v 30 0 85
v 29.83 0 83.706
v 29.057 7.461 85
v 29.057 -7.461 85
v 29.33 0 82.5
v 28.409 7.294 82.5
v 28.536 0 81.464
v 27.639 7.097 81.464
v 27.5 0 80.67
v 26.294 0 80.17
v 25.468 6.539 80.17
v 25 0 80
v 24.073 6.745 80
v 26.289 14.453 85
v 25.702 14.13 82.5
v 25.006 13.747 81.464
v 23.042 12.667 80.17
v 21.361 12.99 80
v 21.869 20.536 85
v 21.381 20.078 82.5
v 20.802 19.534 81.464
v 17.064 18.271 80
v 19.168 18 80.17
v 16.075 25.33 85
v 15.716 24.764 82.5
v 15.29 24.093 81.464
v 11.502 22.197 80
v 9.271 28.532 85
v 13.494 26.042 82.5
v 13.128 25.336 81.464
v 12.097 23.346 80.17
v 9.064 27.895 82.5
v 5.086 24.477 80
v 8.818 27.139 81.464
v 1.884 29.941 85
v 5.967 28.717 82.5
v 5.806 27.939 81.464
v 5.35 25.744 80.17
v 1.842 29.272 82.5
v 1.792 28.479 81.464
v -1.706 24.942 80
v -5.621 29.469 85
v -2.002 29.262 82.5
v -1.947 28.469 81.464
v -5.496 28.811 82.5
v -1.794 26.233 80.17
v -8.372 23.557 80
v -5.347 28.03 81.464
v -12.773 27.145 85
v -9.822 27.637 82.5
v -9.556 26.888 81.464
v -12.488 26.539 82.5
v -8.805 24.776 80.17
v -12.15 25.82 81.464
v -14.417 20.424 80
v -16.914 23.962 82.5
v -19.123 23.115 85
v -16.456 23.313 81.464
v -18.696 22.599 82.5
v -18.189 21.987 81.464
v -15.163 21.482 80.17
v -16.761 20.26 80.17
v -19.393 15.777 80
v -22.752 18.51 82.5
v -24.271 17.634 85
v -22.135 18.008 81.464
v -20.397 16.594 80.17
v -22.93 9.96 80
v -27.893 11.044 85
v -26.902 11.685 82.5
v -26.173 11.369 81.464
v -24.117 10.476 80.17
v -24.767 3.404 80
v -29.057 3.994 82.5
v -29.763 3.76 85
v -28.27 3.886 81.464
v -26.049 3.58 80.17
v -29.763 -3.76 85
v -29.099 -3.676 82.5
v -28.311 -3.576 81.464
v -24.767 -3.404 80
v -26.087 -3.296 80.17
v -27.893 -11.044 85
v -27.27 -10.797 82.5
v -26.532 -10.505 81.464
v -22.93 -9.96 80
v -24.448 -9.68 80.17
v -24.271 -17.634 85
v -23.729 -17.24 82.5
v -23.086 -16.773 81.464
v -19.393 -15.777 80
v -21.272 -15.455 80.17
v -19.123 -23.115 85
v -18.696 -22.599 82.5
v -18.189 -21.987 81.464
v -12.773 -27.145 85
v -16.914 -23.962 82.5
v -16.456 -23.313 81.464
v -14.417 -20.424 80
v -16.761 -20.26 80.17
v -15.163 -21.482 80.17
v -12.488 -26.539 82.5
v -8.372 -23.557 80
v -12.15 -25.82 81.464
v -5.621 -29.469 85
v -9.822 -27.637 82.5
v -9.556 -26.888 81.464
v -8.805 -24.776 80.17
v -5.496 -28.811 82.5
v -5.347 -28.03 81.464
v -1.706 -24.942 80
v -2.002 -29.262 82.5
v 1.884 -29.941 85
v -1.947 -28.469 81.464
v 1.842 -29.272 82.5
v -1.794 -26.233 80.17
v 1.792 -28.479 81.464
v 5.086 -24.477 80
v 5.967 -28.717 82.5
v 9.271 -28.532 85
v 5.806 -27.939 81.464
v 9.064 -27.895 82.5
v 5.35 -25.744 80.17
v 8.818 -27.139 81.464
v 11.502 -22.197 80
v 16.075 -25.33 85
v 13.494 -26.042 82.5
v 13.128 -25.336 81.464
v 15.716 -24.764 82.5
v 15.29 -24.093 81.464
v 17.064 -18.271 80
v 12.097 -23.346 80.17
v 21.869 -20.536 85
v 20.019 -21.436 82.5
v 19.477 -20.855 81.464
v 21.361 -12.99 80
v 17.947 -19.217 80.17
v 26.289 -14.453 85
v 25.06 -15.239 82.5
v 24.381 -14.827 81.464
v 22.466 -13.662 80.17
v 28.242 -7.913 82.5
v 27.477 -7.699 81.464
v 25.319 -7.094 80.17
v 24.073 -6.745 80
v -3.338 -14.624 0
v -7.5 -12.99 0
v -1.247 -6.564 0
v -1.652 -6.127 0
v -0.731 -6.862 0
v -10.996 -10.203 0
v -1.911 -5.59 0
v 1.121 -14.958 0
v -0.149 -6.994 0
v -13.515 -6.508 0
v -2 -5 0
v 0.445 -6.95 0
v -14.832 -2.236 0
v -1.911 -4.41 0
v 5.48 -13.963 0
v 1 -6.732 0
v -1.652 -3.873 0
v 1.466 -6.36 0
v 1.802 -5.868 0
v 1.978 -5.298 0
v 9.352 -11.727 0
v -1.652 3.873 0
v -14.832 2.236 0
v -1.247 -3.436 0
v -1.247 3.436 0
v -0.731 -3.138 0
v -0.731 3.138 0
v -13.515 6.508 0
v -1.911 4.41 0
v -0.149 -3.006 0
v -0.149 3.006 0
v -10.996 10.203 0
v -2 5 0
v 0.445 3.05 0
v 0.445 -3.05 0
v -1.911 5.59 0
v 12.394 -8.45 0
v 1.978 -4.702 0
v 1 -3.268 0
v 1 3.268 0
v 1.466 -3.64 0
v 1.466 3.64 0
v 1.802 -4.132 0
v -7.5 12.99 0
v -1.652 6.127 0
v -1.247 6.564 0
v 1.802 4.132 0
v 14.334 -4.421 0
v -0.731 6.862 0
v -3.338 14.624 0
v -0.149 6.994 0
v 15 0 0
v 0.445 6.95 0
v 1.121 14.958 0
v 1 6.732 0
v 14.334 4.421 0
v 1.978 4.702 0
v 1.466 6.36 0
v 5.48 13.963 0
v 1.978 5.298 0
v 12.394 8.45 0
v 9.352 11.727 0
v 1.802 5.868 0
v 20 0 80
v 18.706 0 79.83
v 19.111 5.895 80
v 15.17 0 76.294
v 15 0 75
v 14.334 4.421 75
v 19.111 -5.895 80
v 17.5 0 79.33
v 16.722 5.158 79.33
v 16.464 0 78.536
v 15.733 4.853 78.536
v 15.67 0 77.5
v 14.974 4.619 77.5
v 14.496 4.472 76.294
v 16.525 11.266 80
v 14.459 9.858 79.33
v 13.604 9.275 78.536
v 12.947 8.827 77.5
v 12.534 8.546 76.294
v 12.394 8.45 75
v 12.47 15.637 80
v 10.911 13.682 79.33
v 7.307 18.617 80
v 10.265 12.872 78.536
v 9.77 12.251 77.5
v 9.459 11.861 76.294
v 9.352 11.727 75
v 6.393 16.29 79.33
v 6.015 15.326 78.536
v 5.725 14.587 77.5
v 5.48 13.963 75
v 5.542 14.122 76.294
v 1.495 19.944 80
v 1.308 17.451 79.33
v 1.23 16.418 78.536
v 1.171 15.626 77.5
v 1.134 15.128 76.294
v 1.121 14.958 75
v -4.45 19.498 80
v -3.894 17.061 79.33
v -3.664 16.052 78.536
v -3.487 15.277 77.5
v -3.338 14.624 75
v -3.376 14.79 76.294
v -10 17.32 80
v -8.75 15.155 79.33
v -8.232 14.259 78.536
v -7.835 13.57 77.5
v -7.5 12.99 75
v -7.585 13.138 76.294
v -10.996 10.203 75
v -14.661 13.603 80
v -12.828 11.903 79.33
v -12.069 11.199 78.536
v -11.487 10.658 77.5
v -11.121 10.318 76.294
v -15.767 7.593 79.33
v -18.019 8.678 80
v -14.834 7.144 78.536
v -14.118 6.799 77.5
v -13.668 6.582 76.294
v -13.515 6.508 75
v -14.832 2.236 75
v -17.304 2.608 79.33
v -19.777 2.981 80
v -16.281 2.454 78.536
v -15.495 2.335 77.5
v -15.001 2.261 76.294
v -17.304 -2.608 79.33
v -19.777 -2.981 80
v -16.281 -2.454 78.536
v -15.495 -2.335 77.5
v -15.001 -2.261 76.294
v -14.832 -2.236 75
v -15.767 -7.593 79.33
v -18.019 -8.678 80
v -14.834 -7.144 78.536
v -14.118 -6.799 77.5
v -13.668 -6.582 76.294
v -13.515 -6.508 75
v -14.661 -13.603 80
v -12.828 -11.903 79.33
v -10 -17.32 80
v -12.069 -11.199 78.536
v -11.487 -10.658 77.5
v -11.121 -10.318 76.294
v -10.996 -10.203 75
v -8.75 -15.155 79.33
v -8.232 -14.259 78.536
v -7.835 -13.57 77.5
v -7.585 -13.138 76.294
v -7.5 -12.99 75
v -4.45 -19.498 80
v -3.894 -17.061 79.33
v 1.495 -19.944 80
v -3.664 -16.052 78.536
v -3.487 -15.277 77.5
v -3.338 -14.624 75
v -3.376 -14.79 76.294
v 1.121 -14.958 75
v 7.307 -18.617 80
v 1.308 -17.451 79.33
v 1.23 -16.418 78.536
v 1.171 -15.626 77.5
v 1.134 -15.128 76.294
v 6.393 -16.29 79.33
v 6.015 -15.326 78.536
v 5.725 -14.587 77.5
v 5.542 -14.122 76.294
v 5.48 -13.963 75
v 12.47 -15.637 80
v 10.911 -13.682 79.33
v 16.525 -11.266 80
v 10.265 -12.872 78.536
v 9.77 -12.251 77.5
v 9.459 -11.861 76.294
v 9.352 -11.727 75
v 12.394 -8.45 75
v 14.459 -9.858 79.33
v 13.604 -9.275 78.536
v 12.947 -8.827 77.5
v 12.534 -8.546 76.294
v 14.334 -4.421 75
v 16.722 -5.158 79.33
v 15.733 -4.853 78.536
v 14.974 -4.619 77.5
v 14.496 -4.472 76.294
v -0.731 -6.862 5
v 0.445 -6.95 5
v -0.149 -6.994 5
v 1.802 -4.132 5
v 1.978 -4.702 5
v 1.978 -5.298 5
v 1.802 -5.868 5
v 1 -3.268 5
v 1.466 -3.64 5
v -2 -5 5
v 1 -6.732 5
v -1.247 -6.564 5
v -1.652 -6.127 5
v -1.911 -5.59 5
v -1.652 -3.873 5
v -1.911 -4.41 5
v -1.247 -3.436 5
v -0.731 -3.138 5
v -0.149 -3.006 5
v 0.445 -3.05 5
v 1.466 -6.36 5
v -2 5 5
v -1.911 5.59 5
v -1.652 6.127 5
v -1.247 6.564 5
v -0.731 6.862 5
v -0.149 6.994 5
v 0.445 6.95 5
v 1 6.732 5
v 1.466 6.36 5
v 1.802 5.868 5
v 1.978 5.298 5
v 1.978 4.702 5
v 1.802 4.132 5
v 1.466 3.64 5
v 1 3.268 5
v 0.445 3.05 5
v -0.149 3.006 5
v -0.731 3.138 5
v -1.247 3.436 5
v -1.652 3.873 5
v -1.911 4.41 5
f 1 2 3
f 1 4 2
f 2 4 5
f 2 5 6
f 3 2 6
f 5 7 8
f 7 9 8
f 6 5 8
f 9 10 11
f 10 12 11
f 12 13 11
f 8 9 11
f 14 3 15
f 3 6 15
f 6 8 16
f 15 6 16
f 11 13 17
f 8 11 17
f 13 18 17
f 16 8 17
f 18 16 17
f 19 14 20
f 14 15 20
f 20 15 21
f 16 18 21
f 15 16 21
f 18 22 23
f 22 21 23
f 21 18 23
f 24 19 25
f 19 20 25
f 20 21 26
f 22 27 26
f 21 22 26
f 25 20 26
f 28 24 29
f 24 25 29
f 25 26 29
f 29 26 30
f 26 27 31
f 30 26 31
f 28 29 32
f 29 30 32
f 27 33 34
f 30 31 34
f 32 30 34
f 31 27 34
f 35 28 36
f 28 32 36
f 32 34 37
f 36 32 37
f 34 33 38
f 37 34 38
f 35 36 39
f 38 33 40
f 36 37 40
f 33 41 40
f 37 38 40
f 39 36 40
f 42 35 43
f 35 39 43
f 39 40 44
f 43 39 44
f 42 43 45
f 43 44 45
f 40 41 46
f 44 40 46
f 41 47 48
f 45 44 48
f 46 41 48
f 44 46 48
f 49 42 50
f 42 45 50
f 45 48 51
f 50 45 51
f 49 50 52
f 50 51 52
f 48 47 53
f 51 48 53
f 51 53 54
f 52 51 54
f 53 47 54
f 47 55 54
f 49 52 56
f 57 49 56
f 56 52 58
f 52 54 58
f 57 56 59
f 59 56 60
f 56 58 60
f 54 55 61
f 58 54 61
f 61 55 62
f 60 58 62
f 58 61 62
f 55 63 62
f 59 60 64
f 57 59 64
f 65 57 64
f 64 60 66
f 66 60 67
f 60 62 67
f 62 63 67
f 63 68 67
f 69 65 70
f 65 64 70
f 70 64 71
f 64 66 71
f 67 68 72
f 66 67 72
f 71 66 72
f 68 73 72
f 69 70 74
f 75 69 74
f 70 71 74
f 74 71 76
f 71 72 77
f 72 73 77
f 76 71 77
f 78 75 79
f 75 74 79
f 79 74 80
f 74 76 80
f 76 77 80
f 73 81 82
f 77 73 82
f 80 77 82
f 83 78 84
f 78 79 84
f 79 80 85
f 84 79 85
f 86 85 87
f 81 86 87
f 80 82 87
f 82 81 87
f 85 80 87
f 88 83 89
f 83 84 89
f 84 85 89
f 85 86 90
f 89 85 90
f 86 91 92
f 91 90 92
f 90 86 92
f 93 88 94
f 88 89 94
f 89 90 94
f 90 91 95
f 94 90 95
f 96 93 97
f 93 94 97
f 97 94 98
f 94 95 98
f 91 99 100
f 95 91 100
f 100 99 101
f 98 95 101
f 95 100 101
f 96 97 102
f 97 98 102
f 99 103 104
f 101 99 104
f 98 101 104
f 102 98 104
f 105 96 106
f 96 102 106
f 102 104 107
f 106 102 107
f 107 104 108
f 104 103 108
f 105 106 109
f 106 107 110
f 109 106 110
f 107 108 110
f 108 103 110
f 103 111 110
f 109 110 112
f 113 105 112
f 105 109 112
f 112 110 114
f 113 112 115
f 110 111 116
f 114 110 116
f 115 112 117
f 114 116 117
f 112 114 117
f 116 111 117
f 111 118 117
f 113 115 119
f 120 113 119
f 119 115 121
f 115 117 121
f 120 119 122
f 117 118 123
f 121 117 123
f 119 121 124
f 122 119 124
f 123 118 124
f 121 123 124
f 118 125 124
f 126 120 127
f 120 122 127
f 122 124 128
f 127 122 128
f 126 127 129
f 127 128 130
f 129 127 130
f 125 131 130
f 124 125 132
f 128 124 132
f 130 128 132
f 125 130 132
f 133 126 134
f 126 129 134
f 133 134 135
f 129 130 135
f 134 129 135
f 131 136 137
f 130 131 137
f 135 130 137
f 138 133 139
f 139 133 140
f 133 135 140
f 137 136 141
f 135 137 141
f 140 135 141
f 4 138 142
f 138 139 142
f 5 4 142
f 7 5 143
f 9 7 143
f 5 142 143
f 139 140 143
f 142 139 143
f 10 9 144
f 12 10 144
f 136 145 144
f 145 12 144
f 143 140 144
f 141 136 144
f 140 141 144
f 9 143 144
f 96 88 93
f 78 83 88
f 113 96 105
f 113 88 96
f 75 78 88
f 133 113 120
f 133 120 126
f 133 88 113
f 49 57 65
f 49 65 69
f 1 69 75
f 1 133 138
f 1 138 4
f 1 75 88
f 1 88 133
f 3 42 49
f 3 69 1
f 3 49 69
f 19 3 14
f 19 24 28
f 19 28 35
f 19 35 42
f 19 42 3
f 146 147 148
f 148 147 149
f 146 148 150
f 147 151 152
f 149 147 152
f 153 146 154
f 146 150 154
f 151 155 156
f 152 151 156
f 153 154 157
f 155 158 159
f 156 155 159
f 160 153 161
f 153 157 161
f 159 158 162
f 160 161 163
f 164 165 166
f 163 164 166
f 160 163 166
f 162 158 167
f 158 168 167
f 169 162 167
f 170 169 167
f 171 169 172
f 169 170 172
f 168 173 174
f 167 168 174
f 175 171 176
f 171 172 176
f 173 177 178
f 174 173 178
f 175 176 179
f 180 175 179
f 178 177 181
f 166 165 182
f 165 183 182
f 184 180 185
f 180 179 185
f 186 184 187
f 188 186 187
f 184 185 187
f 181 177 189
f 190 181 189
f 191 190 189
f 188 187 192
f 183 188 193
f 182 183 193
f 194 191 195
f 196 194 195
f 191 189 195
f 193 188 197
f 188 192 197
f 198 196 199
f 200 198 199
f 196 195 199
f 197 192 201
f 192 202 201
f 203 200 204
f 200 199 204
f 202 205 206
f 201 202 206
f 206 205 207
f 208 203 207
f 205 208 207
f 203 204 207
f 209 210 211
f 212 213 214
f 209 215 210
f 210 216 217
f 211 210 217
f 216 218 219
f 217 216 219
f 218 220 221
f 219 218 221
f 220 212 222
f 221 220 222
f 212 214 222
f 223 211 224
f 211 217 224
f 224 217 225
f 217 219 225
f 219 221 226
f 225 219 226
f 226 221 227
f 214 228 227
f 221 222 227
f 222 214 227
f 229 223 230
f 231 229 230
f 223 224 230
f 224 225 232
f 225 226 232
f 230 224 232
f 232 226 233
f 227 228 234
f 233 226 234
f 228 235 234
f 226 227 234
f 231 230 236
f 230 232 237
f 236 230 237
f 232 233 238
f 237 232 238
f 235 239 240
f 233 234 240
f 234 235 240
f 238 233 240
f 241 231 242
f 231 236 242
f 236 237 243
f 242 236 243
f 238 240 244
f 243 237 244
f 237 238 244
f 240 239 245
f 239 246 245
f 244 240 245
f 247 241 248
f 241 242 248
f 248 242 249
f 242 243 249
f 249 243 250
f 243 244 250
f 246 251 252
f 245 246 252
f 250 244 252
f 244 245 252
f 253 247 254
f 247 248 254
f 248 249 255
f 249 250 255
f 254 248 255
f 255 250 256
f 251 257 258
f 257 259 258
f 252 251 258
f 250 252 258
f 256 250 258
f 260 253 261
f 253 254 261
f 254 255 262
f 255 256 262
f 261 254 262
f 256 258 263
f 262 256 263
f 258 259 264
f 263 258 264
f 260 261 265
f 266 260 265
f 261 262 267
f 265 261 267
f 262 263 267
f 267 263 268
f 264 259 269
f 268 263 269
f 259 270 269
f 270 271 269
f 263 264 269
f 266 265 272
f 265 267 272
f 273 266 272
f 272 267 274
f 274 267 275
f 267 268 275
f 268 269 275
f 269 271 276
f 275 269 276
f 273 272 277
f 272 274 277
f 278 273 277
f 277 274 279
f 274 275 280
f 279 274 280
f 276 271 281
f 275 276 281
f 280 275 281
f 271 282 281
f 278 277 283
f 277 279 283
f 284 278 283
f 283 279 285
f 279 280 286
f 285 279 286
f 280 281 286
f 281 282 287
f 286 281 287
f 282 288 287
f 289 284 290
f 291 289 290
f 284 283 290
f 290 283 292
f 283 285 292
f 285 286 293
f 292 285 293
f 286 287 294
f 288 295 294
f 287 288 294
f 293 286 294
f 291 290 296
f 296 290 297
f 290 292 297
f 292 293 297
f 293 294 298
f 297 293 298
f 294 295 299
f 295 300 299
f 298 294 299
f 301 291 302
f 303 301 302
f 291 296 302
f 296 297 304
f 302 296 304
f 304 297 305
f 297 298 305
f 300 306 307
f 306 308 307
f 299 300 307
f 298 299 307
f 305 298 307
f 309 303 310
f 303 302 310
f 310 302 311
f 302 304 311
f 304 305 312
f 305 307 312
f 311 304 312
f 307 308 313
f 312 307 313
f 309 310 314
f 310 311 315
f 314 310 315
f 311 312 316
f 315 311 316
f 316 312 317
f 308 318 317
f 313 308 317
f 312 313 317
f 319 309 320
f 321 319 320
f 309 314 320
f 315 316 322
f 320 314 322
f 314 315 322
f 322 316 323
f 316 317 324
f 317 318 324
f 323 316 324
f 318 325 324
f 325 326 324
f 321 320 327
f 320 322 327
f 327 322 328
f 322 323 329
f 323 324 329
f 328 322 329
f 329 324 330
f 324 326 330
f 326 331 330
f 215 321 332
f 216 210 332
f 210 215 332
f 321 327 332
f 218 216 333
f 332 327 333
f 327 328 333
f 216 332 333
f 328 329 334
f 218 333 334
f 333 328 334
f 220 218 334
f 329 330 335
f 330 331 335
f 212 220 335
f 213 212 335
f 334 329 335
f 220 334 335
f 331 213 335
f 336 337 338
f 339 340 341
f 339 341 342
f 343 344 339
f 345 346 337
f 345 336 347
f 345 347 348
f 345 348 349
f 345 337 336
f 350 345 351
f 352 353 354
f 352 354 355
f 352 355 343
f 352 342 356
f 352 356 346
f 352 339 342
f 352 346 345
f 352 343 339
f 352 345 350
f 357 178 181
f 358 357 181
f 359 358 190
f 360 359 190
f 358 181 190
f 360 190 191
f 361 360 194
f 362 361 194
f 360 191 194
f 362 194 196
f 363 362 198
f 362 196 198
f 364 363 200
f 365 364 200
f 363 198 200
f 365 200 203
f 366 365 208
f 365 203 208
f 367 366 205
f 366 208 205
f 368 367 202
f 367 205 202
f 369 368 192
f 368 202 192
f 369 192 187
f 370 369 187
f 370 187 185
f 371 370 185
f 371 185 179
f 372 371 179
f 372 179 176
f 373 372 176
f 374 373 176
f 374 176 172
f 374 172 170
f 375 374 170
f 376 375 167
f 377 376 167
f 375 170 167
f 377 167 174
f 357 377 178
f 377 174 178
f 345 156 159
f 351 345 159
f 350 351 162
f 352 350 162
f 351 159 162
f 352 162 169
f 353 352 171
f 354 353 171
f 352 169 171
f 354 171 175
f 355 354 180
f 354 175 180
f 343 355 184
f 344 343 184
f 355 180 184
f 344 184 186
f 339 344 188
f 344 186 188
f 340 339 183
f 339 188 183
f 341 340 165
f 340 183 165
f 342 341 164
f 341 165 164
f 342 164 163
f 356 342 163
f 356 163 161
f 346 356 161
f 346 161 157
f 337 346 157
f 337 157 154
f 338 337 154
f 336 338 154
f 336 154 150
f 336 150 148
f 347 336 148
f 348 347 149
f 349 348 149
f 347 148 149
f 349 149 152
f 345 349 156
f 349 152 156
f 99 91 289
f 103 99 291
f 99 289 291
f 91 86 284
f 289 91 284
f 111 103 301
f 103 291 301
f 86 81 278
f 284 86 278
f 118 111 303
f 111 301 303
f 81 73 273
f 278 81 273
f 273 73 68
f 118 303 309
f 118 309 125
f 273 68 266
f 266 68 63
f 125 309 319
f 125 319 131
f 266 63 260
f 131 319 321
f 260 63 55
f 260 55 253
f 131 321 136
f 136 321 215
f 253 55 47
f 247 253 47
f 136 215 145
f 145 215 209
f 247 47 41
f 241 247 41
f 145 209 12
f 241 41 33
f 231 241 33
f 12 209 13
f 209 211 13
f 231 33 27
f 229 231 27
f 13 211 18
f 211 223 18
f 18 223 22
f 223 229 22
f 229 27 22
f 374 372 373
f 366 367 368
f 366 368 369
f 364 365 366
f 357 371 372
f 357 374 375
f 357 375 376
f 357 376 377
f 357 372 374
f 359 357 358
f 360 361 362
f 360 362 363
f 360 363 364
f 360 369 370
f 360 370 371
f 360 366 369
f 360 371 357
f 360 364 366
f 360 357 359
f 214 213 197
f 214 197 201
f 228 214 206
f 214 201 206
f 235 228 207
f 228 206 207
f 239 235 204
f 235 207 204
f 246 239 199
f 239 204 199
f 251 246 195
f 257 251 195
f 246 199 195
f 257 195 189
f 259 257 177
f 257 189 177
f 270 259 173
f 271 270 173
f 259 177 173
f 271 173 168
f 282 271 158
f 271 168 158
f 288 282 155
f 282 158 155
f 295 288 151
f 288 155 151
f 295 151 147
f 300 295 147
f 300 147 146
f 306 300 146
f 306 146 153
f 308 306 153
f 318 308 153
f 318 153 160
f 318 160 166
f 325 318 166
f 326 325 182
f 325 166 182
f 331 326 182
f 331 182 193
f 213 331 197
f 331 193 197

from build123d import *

# Parameters (mm, degrees)
SKETCH1_R           = 15
BOSS_EXTRUDE1_DEPTH = 80
SKETCH2_R           = 30
BOSS_EXTRUDE2_DEPTH = 5
FILLET1_R           = 5
SKETCH3_R           = 2
CUT_EXTRUDE1_DEPTH  = 5


with BuildPart() as part:
    # Sketch1 → Boss-Extrude1 (new body)
    with BuildSketch(Plane.XY):
        Circle(SKETCH1_R)
    extrude(amount=BOSS_EXTRUDE1_DEPTH)

    # Sketch2 → Boss-Extrude2 (add)
    with BuildSketch(Plane.XY.offset(80)):
        Circle(SKETCH2_R)
    extrude(amount=BOSS_EXTRUDE2_DEPTH)

    # Fillet1
    fillet1_edges = [part.edges().sort_by_distance(p)[0] for p in [
        (-15, 0, 80),
        (-30, 0, 80),
    ]]
    fillet(fillet1_edges, radius=FILLET1_R - 0.0001)  # a hair under: the kernel refuses the full size

    # Sketch3 → Cut-Extrude1 (cut)
    with BuildSketch(Plane(origin=(0, 0, 0), x_dir=(-1, 0, 0), z_dir=(0, 0, -1))):
        with Locations((0, 5)):
            Circle(SKETCH3_R)
        with Locations((0, -5)):
            Circle(SKETCH3_R)
    extrude(amount=-CUT_EXTRUDE1_DEPTH, mode=Mode.SUBTRACT)


solid = part.part
